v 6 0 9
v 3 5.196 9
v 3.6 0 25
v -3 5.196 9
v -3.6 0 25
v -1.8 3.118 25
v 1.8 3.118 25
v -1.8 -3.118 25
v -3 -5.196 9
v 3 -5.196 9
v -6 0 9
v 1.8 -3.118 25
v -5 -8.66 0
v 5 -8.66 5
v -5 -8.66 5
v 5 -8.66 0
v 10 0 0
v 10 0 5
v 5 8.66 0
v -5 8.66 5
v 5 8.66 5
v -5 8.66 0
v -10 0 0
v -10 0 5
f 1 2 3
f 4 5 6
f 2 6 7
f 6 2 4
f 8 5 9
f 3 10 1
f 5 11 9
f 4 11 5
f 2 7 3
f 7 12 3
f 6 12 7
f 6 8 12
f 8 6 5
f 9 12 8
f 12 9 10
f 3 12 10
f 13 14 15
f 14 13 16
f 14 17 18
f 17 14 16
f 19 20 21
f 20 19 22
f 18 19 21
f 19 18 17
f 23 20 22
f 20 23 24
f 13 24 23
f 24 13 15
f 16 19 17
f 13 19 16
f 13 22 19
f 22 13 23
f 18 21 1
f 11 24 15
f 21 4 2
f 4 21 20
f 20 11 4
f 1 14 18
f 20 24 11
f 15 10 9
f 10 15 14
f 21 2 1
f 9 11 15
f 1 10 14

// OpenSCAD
// file: config.scad
piece_diam = 12;
base_diam = 20;
base_height = 5;
pawn_height = 25;


$fn=6;
// main file
include <config.scad>;

module piece_base(height,top_diam){
	union(){
		translate([0,0,base_height+(base_diam-piece_diam)/2])
		cylinder(r1=piece_diam/2,r2=top_diam/2,h=height-base_height-(base_diam-piece_diam)/2);
		cylinder(r=base_diam/2,h=base_height);
		translate([0,0,base_height])
			cylinder(r1=base_diam/2,
						r2=piece_diam/2,
						h=(base_diam-piece_diam)/2);
	}
}

piece_base(pawn_height,piece_diam*0.6);
